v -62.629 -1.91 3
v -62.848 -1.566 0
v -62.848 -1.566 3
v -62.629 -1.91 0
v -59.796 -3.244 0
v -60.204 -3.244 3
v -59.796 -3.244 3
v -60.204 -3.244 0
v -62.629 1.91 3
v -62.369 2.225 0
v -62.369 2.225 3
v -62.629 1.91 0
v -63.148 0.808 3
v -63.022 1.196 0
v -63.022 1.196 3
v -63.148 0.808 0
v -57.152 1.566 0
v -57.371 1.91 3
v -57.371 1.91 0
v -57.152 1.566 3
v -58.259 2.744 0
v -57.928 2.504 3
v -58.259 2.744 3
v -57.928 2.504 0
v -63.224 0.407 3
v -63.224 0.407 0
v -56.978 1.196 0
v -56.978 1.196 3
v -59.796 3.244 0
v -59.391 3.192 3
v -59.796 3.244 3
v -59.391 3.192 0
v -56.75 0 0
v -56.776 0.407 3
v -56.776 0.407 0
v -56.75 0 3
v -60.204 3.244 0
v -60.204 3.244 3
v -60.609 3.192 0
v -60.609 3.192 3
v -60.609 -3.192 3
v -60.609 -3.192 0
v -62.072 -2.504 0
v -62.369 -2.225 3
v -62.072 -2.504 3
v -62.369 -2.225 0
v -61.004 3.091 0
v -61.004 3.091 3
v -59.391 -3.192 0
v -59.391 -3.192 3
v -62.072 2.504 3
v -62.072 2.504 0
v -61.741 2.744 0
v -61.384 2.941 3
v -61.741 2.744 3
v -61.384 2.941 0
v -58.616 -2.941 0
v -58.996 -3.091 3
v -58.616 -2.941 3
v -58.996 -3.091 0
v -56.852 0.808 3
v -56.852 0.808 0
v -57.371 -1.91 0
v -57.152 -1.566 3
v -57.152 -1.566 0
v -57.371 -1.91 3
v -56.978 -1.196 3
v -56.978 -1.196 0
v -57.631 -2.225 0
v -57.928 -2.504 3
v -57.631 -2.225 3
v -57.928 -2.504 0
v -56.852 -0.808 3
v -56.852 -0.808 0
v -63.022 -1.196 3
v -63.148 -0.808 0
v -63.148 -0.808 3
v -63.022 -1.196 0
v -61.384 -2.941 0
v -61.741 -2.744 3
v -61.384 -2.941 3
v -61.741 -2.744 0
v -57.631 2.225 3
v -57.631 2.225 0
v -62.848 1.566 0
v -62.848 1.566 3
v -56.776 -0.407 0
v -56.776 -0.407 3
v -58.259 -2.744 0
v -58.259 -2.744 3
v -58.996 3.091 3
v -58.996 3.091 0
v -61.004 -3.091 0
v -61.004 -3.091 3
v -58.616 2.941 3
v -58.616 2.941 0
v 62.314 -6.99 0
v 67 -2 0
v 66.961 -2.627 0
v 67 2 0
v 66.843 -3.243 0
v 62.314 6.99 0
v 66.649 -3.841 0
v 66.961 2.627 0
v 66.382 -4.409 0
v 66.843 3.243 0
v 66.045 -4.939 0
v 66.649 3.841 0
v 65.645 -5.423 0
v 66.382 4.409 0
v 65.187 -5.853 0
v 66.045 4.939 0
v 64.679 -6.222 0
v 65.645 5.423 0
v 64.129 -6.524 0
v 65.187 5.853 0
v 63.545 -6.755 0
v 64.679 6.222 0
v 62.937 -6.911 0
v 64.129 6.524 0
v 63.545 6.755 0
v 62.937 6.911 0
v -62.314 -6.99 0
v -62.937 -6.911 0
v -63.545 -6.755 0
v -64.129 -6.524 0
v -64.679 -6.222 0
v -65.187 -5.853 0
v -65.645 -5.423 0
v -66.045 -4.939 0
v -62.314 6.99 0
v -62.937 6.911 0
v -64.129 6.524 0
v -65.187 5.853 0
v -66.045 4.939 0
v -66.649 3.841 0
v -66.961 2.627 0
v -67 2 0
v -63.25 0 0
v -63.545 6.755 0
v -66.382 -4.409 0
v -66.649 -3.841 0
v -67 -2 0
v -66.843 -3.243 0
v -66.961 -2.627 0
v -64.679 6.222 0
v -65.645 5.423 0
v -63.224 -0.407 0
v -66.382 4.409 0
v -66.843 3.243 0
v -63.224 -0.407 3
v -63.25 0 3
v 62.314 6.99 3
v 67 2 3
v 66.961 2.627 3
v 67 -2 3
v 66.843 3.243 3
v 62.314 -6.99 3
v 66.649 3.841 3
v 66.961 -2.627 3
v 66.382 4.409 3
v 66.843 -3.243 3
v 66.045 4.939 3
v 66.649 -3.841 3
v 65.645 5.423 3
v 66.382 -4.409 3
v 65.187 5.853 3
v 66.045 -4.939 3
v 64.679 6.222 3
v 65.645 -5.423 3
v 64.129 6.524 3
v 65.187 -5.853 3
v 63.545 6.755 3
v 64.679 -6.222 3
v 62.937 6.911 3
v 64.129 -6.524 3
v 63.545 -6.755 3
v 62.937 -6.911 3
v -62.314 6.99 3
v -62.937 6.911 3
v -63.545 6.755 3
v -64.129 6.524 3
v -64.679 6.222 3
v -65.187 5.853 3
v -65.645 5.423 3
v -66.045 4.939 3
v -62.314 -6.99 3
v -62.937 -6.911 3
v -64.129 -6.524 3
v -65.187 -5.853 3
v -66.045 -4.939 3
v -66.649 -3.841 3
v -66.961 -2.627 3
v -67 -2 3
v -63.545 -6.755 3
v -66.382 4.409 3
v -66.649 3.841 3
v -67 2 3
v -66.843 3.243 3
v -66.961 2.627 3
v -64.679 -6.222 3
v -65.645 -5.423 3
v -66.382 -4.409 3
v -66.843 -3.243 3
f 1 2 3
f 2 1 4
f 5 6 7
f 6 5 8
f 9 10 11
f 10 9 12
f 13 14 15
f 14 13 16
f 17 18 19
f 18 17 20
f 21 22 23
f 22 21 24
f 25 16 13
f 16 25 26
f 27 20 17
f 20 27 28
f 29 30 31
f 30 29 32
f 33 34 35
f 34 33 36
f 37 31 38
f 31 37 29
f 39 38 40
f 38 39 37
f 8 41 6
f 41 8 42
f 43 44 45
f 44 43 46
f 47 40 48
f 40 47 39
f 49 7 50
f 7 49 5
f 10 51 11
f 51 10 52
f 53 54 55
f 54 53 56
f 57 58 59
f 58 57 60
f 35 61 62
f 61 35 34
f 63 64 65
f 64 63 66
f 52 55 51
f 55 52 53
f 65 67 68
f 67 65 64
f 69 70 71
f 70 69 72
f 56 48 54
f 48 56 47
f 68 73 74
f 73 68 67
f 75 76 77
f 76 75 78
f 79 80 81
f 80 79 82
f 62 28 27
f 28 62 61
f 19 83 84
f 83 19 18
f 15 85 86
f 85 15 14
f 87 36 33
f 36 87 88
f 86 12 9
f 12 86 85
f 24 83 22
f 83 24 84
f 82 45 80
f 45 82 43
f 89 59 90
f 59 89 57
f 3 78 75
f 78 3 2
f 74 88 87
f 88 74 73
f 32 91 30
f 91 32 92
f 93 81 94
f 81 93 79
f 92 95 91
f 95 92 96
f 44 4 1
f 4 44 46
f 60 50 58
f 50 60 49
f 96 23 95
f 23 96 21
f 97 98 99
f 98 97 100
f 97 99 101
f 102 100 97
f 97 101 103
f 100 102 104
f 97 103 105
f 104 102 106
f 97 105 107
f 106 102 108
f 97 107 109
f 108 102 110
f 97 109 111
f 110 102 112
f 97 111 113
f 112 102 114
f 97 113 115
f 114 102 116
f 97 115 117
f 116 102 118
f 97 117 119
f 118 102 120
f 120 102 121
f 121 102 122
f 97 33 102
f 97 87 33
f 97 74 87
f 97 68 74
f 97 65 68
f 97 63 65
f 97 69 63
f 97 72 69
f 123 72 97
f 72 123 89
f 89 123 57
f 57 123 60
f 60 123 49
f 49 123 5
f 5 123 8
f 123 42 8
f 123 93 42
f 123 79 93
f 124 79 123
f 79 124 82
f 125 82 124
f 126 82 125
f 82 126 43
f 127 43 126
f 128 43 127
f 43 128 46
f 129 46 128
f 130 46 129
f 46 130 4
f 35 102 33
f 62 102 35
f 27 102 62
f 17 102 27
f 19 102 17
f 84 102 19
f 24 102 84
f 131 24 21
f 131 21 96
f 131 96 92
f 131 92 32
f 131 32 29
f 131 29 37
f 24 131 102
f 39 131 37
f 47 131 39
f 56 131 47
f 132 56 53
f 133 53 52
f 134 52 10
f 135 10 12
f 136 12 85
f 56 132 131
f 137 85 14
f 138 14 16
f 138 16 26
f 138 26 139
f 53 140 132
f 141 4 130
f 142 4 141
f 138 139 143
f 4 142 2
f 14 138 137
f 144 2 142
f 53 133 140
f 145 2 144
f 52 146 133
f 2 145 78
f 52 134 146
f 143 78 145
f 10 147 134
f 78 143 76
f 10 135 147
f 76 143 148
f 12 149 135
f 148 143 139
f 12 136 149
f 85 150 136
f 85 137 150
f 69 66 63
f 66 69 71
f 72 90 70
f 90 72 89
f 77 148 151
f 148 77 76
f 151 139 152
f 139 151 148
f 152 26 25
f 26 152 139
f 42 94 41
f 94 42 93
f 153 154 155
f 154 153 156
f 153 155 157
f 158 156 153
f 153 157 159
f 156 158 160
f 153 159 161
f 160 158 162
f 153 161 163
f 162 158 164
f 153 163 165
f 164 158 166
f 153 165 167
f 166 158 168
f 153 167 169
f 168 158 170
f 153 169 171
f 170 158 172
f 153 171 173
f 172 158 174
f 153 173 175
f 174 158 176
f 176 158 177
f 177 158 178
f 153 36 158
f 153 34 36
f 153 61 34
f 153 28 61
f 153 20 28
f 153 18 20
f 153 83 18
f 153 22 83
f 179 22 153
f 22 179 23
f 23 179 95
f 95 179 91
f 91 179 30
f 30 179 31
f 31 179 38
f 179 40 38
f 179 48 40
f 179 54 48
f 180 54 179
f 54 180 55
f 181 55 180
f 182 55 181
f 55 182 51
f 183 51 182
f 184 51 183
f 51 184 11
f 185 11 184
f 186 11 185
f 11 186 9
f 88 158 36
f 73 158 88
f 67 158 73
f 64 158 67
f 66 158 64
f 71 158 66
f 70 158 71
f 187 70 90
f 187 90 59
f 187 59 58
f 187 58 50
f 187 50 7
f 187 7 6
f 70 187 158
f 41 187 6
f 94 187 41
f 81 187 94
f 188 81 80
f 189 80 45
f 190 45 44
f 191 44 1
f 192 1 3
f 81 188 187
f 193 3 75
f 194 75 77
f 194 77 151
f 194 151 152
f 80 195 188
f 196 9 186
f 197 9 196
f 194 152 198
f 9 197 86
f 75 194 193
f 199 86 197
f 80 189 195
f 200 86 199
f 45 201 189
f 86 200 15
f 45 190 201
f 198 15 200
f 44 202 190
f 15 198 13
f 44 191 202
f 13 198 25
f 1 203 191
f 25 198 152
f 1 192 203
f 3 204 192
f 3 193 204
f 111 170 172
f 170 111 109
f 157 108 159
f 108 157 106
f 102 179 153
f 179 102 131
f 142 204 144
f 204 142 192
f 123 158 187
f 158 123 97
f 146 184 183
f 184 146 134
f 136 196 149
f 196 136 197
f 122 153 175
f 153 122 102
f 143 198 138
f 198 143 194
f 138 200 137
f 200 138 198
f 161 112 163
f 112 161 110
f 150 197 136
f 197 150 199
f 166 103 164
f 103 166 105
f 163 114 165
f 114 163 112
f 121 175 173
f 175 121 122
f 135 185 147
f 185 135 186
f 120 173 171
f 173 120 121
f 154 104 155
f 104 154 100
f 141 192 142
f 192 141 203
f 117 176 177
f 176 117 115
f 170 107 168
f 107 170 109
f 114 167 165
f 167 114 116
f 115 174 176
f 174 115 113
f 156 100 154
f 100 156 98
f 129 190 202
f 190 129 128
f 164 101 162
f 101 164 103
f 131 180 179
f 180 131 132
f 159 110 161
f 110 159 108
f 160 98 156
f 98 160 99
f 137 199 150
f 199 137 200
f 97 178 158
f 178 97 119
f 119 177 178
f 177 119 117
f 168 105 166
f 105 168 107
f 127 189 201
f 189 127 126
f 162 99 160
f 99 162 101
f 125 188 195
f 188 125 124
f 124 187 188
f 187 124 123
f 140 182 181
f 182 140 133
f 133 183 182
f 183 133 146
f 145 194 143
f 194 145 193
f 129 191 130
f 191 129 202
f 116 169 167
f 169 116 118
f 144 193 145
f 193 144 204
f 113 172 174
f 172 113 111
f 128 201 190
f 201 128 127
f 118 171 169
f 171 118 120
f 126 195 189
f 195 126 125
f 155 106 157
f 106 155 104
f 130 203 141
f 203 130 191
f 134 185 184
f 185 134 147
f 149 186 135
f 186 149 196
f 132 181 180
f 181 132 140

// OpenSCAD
$fn = 50;


difference() {
	union() {
		hull() {
			translate(v = [-62.0000000000, 2.0000000000, 0]) {
				cylinder(h = 3, r = 5);
			}
			translate(v = [62.0000000000, 2.0000000000, 0]) {
				cylinder(h = 3, r = 5);
			}
			translate(v = [-62.0000000000, -2.0000000000, 0]) {
				cylinder(h = 3, r = 5);
			}
			translate(v = [62.0000000000, -2.0000000000, 0]) {
				cylinder(h = 3, r = 5);
			}
		}
	}
	union() {
		translate(v = [-60.0000000000, 0.0000000000, 0]) {
			cylinder(h = 3, r = 3.2500000000);
		}
		translate(v = [-60.0000000000, 0.0000000000, 0]) {
			cylinder(h = 3, r = 1.8000000000);
		}
		translate(v = [-60.0000000000, 0.0000000000, 0]) {
			cylinder(h = 3, r = 1.8000000000);
		}
		translate(v = [-60.0000000000, 0.0000000000, 0]) {
			cylinder(h = 3, r = 1.8000000000);
		}
	}
}
